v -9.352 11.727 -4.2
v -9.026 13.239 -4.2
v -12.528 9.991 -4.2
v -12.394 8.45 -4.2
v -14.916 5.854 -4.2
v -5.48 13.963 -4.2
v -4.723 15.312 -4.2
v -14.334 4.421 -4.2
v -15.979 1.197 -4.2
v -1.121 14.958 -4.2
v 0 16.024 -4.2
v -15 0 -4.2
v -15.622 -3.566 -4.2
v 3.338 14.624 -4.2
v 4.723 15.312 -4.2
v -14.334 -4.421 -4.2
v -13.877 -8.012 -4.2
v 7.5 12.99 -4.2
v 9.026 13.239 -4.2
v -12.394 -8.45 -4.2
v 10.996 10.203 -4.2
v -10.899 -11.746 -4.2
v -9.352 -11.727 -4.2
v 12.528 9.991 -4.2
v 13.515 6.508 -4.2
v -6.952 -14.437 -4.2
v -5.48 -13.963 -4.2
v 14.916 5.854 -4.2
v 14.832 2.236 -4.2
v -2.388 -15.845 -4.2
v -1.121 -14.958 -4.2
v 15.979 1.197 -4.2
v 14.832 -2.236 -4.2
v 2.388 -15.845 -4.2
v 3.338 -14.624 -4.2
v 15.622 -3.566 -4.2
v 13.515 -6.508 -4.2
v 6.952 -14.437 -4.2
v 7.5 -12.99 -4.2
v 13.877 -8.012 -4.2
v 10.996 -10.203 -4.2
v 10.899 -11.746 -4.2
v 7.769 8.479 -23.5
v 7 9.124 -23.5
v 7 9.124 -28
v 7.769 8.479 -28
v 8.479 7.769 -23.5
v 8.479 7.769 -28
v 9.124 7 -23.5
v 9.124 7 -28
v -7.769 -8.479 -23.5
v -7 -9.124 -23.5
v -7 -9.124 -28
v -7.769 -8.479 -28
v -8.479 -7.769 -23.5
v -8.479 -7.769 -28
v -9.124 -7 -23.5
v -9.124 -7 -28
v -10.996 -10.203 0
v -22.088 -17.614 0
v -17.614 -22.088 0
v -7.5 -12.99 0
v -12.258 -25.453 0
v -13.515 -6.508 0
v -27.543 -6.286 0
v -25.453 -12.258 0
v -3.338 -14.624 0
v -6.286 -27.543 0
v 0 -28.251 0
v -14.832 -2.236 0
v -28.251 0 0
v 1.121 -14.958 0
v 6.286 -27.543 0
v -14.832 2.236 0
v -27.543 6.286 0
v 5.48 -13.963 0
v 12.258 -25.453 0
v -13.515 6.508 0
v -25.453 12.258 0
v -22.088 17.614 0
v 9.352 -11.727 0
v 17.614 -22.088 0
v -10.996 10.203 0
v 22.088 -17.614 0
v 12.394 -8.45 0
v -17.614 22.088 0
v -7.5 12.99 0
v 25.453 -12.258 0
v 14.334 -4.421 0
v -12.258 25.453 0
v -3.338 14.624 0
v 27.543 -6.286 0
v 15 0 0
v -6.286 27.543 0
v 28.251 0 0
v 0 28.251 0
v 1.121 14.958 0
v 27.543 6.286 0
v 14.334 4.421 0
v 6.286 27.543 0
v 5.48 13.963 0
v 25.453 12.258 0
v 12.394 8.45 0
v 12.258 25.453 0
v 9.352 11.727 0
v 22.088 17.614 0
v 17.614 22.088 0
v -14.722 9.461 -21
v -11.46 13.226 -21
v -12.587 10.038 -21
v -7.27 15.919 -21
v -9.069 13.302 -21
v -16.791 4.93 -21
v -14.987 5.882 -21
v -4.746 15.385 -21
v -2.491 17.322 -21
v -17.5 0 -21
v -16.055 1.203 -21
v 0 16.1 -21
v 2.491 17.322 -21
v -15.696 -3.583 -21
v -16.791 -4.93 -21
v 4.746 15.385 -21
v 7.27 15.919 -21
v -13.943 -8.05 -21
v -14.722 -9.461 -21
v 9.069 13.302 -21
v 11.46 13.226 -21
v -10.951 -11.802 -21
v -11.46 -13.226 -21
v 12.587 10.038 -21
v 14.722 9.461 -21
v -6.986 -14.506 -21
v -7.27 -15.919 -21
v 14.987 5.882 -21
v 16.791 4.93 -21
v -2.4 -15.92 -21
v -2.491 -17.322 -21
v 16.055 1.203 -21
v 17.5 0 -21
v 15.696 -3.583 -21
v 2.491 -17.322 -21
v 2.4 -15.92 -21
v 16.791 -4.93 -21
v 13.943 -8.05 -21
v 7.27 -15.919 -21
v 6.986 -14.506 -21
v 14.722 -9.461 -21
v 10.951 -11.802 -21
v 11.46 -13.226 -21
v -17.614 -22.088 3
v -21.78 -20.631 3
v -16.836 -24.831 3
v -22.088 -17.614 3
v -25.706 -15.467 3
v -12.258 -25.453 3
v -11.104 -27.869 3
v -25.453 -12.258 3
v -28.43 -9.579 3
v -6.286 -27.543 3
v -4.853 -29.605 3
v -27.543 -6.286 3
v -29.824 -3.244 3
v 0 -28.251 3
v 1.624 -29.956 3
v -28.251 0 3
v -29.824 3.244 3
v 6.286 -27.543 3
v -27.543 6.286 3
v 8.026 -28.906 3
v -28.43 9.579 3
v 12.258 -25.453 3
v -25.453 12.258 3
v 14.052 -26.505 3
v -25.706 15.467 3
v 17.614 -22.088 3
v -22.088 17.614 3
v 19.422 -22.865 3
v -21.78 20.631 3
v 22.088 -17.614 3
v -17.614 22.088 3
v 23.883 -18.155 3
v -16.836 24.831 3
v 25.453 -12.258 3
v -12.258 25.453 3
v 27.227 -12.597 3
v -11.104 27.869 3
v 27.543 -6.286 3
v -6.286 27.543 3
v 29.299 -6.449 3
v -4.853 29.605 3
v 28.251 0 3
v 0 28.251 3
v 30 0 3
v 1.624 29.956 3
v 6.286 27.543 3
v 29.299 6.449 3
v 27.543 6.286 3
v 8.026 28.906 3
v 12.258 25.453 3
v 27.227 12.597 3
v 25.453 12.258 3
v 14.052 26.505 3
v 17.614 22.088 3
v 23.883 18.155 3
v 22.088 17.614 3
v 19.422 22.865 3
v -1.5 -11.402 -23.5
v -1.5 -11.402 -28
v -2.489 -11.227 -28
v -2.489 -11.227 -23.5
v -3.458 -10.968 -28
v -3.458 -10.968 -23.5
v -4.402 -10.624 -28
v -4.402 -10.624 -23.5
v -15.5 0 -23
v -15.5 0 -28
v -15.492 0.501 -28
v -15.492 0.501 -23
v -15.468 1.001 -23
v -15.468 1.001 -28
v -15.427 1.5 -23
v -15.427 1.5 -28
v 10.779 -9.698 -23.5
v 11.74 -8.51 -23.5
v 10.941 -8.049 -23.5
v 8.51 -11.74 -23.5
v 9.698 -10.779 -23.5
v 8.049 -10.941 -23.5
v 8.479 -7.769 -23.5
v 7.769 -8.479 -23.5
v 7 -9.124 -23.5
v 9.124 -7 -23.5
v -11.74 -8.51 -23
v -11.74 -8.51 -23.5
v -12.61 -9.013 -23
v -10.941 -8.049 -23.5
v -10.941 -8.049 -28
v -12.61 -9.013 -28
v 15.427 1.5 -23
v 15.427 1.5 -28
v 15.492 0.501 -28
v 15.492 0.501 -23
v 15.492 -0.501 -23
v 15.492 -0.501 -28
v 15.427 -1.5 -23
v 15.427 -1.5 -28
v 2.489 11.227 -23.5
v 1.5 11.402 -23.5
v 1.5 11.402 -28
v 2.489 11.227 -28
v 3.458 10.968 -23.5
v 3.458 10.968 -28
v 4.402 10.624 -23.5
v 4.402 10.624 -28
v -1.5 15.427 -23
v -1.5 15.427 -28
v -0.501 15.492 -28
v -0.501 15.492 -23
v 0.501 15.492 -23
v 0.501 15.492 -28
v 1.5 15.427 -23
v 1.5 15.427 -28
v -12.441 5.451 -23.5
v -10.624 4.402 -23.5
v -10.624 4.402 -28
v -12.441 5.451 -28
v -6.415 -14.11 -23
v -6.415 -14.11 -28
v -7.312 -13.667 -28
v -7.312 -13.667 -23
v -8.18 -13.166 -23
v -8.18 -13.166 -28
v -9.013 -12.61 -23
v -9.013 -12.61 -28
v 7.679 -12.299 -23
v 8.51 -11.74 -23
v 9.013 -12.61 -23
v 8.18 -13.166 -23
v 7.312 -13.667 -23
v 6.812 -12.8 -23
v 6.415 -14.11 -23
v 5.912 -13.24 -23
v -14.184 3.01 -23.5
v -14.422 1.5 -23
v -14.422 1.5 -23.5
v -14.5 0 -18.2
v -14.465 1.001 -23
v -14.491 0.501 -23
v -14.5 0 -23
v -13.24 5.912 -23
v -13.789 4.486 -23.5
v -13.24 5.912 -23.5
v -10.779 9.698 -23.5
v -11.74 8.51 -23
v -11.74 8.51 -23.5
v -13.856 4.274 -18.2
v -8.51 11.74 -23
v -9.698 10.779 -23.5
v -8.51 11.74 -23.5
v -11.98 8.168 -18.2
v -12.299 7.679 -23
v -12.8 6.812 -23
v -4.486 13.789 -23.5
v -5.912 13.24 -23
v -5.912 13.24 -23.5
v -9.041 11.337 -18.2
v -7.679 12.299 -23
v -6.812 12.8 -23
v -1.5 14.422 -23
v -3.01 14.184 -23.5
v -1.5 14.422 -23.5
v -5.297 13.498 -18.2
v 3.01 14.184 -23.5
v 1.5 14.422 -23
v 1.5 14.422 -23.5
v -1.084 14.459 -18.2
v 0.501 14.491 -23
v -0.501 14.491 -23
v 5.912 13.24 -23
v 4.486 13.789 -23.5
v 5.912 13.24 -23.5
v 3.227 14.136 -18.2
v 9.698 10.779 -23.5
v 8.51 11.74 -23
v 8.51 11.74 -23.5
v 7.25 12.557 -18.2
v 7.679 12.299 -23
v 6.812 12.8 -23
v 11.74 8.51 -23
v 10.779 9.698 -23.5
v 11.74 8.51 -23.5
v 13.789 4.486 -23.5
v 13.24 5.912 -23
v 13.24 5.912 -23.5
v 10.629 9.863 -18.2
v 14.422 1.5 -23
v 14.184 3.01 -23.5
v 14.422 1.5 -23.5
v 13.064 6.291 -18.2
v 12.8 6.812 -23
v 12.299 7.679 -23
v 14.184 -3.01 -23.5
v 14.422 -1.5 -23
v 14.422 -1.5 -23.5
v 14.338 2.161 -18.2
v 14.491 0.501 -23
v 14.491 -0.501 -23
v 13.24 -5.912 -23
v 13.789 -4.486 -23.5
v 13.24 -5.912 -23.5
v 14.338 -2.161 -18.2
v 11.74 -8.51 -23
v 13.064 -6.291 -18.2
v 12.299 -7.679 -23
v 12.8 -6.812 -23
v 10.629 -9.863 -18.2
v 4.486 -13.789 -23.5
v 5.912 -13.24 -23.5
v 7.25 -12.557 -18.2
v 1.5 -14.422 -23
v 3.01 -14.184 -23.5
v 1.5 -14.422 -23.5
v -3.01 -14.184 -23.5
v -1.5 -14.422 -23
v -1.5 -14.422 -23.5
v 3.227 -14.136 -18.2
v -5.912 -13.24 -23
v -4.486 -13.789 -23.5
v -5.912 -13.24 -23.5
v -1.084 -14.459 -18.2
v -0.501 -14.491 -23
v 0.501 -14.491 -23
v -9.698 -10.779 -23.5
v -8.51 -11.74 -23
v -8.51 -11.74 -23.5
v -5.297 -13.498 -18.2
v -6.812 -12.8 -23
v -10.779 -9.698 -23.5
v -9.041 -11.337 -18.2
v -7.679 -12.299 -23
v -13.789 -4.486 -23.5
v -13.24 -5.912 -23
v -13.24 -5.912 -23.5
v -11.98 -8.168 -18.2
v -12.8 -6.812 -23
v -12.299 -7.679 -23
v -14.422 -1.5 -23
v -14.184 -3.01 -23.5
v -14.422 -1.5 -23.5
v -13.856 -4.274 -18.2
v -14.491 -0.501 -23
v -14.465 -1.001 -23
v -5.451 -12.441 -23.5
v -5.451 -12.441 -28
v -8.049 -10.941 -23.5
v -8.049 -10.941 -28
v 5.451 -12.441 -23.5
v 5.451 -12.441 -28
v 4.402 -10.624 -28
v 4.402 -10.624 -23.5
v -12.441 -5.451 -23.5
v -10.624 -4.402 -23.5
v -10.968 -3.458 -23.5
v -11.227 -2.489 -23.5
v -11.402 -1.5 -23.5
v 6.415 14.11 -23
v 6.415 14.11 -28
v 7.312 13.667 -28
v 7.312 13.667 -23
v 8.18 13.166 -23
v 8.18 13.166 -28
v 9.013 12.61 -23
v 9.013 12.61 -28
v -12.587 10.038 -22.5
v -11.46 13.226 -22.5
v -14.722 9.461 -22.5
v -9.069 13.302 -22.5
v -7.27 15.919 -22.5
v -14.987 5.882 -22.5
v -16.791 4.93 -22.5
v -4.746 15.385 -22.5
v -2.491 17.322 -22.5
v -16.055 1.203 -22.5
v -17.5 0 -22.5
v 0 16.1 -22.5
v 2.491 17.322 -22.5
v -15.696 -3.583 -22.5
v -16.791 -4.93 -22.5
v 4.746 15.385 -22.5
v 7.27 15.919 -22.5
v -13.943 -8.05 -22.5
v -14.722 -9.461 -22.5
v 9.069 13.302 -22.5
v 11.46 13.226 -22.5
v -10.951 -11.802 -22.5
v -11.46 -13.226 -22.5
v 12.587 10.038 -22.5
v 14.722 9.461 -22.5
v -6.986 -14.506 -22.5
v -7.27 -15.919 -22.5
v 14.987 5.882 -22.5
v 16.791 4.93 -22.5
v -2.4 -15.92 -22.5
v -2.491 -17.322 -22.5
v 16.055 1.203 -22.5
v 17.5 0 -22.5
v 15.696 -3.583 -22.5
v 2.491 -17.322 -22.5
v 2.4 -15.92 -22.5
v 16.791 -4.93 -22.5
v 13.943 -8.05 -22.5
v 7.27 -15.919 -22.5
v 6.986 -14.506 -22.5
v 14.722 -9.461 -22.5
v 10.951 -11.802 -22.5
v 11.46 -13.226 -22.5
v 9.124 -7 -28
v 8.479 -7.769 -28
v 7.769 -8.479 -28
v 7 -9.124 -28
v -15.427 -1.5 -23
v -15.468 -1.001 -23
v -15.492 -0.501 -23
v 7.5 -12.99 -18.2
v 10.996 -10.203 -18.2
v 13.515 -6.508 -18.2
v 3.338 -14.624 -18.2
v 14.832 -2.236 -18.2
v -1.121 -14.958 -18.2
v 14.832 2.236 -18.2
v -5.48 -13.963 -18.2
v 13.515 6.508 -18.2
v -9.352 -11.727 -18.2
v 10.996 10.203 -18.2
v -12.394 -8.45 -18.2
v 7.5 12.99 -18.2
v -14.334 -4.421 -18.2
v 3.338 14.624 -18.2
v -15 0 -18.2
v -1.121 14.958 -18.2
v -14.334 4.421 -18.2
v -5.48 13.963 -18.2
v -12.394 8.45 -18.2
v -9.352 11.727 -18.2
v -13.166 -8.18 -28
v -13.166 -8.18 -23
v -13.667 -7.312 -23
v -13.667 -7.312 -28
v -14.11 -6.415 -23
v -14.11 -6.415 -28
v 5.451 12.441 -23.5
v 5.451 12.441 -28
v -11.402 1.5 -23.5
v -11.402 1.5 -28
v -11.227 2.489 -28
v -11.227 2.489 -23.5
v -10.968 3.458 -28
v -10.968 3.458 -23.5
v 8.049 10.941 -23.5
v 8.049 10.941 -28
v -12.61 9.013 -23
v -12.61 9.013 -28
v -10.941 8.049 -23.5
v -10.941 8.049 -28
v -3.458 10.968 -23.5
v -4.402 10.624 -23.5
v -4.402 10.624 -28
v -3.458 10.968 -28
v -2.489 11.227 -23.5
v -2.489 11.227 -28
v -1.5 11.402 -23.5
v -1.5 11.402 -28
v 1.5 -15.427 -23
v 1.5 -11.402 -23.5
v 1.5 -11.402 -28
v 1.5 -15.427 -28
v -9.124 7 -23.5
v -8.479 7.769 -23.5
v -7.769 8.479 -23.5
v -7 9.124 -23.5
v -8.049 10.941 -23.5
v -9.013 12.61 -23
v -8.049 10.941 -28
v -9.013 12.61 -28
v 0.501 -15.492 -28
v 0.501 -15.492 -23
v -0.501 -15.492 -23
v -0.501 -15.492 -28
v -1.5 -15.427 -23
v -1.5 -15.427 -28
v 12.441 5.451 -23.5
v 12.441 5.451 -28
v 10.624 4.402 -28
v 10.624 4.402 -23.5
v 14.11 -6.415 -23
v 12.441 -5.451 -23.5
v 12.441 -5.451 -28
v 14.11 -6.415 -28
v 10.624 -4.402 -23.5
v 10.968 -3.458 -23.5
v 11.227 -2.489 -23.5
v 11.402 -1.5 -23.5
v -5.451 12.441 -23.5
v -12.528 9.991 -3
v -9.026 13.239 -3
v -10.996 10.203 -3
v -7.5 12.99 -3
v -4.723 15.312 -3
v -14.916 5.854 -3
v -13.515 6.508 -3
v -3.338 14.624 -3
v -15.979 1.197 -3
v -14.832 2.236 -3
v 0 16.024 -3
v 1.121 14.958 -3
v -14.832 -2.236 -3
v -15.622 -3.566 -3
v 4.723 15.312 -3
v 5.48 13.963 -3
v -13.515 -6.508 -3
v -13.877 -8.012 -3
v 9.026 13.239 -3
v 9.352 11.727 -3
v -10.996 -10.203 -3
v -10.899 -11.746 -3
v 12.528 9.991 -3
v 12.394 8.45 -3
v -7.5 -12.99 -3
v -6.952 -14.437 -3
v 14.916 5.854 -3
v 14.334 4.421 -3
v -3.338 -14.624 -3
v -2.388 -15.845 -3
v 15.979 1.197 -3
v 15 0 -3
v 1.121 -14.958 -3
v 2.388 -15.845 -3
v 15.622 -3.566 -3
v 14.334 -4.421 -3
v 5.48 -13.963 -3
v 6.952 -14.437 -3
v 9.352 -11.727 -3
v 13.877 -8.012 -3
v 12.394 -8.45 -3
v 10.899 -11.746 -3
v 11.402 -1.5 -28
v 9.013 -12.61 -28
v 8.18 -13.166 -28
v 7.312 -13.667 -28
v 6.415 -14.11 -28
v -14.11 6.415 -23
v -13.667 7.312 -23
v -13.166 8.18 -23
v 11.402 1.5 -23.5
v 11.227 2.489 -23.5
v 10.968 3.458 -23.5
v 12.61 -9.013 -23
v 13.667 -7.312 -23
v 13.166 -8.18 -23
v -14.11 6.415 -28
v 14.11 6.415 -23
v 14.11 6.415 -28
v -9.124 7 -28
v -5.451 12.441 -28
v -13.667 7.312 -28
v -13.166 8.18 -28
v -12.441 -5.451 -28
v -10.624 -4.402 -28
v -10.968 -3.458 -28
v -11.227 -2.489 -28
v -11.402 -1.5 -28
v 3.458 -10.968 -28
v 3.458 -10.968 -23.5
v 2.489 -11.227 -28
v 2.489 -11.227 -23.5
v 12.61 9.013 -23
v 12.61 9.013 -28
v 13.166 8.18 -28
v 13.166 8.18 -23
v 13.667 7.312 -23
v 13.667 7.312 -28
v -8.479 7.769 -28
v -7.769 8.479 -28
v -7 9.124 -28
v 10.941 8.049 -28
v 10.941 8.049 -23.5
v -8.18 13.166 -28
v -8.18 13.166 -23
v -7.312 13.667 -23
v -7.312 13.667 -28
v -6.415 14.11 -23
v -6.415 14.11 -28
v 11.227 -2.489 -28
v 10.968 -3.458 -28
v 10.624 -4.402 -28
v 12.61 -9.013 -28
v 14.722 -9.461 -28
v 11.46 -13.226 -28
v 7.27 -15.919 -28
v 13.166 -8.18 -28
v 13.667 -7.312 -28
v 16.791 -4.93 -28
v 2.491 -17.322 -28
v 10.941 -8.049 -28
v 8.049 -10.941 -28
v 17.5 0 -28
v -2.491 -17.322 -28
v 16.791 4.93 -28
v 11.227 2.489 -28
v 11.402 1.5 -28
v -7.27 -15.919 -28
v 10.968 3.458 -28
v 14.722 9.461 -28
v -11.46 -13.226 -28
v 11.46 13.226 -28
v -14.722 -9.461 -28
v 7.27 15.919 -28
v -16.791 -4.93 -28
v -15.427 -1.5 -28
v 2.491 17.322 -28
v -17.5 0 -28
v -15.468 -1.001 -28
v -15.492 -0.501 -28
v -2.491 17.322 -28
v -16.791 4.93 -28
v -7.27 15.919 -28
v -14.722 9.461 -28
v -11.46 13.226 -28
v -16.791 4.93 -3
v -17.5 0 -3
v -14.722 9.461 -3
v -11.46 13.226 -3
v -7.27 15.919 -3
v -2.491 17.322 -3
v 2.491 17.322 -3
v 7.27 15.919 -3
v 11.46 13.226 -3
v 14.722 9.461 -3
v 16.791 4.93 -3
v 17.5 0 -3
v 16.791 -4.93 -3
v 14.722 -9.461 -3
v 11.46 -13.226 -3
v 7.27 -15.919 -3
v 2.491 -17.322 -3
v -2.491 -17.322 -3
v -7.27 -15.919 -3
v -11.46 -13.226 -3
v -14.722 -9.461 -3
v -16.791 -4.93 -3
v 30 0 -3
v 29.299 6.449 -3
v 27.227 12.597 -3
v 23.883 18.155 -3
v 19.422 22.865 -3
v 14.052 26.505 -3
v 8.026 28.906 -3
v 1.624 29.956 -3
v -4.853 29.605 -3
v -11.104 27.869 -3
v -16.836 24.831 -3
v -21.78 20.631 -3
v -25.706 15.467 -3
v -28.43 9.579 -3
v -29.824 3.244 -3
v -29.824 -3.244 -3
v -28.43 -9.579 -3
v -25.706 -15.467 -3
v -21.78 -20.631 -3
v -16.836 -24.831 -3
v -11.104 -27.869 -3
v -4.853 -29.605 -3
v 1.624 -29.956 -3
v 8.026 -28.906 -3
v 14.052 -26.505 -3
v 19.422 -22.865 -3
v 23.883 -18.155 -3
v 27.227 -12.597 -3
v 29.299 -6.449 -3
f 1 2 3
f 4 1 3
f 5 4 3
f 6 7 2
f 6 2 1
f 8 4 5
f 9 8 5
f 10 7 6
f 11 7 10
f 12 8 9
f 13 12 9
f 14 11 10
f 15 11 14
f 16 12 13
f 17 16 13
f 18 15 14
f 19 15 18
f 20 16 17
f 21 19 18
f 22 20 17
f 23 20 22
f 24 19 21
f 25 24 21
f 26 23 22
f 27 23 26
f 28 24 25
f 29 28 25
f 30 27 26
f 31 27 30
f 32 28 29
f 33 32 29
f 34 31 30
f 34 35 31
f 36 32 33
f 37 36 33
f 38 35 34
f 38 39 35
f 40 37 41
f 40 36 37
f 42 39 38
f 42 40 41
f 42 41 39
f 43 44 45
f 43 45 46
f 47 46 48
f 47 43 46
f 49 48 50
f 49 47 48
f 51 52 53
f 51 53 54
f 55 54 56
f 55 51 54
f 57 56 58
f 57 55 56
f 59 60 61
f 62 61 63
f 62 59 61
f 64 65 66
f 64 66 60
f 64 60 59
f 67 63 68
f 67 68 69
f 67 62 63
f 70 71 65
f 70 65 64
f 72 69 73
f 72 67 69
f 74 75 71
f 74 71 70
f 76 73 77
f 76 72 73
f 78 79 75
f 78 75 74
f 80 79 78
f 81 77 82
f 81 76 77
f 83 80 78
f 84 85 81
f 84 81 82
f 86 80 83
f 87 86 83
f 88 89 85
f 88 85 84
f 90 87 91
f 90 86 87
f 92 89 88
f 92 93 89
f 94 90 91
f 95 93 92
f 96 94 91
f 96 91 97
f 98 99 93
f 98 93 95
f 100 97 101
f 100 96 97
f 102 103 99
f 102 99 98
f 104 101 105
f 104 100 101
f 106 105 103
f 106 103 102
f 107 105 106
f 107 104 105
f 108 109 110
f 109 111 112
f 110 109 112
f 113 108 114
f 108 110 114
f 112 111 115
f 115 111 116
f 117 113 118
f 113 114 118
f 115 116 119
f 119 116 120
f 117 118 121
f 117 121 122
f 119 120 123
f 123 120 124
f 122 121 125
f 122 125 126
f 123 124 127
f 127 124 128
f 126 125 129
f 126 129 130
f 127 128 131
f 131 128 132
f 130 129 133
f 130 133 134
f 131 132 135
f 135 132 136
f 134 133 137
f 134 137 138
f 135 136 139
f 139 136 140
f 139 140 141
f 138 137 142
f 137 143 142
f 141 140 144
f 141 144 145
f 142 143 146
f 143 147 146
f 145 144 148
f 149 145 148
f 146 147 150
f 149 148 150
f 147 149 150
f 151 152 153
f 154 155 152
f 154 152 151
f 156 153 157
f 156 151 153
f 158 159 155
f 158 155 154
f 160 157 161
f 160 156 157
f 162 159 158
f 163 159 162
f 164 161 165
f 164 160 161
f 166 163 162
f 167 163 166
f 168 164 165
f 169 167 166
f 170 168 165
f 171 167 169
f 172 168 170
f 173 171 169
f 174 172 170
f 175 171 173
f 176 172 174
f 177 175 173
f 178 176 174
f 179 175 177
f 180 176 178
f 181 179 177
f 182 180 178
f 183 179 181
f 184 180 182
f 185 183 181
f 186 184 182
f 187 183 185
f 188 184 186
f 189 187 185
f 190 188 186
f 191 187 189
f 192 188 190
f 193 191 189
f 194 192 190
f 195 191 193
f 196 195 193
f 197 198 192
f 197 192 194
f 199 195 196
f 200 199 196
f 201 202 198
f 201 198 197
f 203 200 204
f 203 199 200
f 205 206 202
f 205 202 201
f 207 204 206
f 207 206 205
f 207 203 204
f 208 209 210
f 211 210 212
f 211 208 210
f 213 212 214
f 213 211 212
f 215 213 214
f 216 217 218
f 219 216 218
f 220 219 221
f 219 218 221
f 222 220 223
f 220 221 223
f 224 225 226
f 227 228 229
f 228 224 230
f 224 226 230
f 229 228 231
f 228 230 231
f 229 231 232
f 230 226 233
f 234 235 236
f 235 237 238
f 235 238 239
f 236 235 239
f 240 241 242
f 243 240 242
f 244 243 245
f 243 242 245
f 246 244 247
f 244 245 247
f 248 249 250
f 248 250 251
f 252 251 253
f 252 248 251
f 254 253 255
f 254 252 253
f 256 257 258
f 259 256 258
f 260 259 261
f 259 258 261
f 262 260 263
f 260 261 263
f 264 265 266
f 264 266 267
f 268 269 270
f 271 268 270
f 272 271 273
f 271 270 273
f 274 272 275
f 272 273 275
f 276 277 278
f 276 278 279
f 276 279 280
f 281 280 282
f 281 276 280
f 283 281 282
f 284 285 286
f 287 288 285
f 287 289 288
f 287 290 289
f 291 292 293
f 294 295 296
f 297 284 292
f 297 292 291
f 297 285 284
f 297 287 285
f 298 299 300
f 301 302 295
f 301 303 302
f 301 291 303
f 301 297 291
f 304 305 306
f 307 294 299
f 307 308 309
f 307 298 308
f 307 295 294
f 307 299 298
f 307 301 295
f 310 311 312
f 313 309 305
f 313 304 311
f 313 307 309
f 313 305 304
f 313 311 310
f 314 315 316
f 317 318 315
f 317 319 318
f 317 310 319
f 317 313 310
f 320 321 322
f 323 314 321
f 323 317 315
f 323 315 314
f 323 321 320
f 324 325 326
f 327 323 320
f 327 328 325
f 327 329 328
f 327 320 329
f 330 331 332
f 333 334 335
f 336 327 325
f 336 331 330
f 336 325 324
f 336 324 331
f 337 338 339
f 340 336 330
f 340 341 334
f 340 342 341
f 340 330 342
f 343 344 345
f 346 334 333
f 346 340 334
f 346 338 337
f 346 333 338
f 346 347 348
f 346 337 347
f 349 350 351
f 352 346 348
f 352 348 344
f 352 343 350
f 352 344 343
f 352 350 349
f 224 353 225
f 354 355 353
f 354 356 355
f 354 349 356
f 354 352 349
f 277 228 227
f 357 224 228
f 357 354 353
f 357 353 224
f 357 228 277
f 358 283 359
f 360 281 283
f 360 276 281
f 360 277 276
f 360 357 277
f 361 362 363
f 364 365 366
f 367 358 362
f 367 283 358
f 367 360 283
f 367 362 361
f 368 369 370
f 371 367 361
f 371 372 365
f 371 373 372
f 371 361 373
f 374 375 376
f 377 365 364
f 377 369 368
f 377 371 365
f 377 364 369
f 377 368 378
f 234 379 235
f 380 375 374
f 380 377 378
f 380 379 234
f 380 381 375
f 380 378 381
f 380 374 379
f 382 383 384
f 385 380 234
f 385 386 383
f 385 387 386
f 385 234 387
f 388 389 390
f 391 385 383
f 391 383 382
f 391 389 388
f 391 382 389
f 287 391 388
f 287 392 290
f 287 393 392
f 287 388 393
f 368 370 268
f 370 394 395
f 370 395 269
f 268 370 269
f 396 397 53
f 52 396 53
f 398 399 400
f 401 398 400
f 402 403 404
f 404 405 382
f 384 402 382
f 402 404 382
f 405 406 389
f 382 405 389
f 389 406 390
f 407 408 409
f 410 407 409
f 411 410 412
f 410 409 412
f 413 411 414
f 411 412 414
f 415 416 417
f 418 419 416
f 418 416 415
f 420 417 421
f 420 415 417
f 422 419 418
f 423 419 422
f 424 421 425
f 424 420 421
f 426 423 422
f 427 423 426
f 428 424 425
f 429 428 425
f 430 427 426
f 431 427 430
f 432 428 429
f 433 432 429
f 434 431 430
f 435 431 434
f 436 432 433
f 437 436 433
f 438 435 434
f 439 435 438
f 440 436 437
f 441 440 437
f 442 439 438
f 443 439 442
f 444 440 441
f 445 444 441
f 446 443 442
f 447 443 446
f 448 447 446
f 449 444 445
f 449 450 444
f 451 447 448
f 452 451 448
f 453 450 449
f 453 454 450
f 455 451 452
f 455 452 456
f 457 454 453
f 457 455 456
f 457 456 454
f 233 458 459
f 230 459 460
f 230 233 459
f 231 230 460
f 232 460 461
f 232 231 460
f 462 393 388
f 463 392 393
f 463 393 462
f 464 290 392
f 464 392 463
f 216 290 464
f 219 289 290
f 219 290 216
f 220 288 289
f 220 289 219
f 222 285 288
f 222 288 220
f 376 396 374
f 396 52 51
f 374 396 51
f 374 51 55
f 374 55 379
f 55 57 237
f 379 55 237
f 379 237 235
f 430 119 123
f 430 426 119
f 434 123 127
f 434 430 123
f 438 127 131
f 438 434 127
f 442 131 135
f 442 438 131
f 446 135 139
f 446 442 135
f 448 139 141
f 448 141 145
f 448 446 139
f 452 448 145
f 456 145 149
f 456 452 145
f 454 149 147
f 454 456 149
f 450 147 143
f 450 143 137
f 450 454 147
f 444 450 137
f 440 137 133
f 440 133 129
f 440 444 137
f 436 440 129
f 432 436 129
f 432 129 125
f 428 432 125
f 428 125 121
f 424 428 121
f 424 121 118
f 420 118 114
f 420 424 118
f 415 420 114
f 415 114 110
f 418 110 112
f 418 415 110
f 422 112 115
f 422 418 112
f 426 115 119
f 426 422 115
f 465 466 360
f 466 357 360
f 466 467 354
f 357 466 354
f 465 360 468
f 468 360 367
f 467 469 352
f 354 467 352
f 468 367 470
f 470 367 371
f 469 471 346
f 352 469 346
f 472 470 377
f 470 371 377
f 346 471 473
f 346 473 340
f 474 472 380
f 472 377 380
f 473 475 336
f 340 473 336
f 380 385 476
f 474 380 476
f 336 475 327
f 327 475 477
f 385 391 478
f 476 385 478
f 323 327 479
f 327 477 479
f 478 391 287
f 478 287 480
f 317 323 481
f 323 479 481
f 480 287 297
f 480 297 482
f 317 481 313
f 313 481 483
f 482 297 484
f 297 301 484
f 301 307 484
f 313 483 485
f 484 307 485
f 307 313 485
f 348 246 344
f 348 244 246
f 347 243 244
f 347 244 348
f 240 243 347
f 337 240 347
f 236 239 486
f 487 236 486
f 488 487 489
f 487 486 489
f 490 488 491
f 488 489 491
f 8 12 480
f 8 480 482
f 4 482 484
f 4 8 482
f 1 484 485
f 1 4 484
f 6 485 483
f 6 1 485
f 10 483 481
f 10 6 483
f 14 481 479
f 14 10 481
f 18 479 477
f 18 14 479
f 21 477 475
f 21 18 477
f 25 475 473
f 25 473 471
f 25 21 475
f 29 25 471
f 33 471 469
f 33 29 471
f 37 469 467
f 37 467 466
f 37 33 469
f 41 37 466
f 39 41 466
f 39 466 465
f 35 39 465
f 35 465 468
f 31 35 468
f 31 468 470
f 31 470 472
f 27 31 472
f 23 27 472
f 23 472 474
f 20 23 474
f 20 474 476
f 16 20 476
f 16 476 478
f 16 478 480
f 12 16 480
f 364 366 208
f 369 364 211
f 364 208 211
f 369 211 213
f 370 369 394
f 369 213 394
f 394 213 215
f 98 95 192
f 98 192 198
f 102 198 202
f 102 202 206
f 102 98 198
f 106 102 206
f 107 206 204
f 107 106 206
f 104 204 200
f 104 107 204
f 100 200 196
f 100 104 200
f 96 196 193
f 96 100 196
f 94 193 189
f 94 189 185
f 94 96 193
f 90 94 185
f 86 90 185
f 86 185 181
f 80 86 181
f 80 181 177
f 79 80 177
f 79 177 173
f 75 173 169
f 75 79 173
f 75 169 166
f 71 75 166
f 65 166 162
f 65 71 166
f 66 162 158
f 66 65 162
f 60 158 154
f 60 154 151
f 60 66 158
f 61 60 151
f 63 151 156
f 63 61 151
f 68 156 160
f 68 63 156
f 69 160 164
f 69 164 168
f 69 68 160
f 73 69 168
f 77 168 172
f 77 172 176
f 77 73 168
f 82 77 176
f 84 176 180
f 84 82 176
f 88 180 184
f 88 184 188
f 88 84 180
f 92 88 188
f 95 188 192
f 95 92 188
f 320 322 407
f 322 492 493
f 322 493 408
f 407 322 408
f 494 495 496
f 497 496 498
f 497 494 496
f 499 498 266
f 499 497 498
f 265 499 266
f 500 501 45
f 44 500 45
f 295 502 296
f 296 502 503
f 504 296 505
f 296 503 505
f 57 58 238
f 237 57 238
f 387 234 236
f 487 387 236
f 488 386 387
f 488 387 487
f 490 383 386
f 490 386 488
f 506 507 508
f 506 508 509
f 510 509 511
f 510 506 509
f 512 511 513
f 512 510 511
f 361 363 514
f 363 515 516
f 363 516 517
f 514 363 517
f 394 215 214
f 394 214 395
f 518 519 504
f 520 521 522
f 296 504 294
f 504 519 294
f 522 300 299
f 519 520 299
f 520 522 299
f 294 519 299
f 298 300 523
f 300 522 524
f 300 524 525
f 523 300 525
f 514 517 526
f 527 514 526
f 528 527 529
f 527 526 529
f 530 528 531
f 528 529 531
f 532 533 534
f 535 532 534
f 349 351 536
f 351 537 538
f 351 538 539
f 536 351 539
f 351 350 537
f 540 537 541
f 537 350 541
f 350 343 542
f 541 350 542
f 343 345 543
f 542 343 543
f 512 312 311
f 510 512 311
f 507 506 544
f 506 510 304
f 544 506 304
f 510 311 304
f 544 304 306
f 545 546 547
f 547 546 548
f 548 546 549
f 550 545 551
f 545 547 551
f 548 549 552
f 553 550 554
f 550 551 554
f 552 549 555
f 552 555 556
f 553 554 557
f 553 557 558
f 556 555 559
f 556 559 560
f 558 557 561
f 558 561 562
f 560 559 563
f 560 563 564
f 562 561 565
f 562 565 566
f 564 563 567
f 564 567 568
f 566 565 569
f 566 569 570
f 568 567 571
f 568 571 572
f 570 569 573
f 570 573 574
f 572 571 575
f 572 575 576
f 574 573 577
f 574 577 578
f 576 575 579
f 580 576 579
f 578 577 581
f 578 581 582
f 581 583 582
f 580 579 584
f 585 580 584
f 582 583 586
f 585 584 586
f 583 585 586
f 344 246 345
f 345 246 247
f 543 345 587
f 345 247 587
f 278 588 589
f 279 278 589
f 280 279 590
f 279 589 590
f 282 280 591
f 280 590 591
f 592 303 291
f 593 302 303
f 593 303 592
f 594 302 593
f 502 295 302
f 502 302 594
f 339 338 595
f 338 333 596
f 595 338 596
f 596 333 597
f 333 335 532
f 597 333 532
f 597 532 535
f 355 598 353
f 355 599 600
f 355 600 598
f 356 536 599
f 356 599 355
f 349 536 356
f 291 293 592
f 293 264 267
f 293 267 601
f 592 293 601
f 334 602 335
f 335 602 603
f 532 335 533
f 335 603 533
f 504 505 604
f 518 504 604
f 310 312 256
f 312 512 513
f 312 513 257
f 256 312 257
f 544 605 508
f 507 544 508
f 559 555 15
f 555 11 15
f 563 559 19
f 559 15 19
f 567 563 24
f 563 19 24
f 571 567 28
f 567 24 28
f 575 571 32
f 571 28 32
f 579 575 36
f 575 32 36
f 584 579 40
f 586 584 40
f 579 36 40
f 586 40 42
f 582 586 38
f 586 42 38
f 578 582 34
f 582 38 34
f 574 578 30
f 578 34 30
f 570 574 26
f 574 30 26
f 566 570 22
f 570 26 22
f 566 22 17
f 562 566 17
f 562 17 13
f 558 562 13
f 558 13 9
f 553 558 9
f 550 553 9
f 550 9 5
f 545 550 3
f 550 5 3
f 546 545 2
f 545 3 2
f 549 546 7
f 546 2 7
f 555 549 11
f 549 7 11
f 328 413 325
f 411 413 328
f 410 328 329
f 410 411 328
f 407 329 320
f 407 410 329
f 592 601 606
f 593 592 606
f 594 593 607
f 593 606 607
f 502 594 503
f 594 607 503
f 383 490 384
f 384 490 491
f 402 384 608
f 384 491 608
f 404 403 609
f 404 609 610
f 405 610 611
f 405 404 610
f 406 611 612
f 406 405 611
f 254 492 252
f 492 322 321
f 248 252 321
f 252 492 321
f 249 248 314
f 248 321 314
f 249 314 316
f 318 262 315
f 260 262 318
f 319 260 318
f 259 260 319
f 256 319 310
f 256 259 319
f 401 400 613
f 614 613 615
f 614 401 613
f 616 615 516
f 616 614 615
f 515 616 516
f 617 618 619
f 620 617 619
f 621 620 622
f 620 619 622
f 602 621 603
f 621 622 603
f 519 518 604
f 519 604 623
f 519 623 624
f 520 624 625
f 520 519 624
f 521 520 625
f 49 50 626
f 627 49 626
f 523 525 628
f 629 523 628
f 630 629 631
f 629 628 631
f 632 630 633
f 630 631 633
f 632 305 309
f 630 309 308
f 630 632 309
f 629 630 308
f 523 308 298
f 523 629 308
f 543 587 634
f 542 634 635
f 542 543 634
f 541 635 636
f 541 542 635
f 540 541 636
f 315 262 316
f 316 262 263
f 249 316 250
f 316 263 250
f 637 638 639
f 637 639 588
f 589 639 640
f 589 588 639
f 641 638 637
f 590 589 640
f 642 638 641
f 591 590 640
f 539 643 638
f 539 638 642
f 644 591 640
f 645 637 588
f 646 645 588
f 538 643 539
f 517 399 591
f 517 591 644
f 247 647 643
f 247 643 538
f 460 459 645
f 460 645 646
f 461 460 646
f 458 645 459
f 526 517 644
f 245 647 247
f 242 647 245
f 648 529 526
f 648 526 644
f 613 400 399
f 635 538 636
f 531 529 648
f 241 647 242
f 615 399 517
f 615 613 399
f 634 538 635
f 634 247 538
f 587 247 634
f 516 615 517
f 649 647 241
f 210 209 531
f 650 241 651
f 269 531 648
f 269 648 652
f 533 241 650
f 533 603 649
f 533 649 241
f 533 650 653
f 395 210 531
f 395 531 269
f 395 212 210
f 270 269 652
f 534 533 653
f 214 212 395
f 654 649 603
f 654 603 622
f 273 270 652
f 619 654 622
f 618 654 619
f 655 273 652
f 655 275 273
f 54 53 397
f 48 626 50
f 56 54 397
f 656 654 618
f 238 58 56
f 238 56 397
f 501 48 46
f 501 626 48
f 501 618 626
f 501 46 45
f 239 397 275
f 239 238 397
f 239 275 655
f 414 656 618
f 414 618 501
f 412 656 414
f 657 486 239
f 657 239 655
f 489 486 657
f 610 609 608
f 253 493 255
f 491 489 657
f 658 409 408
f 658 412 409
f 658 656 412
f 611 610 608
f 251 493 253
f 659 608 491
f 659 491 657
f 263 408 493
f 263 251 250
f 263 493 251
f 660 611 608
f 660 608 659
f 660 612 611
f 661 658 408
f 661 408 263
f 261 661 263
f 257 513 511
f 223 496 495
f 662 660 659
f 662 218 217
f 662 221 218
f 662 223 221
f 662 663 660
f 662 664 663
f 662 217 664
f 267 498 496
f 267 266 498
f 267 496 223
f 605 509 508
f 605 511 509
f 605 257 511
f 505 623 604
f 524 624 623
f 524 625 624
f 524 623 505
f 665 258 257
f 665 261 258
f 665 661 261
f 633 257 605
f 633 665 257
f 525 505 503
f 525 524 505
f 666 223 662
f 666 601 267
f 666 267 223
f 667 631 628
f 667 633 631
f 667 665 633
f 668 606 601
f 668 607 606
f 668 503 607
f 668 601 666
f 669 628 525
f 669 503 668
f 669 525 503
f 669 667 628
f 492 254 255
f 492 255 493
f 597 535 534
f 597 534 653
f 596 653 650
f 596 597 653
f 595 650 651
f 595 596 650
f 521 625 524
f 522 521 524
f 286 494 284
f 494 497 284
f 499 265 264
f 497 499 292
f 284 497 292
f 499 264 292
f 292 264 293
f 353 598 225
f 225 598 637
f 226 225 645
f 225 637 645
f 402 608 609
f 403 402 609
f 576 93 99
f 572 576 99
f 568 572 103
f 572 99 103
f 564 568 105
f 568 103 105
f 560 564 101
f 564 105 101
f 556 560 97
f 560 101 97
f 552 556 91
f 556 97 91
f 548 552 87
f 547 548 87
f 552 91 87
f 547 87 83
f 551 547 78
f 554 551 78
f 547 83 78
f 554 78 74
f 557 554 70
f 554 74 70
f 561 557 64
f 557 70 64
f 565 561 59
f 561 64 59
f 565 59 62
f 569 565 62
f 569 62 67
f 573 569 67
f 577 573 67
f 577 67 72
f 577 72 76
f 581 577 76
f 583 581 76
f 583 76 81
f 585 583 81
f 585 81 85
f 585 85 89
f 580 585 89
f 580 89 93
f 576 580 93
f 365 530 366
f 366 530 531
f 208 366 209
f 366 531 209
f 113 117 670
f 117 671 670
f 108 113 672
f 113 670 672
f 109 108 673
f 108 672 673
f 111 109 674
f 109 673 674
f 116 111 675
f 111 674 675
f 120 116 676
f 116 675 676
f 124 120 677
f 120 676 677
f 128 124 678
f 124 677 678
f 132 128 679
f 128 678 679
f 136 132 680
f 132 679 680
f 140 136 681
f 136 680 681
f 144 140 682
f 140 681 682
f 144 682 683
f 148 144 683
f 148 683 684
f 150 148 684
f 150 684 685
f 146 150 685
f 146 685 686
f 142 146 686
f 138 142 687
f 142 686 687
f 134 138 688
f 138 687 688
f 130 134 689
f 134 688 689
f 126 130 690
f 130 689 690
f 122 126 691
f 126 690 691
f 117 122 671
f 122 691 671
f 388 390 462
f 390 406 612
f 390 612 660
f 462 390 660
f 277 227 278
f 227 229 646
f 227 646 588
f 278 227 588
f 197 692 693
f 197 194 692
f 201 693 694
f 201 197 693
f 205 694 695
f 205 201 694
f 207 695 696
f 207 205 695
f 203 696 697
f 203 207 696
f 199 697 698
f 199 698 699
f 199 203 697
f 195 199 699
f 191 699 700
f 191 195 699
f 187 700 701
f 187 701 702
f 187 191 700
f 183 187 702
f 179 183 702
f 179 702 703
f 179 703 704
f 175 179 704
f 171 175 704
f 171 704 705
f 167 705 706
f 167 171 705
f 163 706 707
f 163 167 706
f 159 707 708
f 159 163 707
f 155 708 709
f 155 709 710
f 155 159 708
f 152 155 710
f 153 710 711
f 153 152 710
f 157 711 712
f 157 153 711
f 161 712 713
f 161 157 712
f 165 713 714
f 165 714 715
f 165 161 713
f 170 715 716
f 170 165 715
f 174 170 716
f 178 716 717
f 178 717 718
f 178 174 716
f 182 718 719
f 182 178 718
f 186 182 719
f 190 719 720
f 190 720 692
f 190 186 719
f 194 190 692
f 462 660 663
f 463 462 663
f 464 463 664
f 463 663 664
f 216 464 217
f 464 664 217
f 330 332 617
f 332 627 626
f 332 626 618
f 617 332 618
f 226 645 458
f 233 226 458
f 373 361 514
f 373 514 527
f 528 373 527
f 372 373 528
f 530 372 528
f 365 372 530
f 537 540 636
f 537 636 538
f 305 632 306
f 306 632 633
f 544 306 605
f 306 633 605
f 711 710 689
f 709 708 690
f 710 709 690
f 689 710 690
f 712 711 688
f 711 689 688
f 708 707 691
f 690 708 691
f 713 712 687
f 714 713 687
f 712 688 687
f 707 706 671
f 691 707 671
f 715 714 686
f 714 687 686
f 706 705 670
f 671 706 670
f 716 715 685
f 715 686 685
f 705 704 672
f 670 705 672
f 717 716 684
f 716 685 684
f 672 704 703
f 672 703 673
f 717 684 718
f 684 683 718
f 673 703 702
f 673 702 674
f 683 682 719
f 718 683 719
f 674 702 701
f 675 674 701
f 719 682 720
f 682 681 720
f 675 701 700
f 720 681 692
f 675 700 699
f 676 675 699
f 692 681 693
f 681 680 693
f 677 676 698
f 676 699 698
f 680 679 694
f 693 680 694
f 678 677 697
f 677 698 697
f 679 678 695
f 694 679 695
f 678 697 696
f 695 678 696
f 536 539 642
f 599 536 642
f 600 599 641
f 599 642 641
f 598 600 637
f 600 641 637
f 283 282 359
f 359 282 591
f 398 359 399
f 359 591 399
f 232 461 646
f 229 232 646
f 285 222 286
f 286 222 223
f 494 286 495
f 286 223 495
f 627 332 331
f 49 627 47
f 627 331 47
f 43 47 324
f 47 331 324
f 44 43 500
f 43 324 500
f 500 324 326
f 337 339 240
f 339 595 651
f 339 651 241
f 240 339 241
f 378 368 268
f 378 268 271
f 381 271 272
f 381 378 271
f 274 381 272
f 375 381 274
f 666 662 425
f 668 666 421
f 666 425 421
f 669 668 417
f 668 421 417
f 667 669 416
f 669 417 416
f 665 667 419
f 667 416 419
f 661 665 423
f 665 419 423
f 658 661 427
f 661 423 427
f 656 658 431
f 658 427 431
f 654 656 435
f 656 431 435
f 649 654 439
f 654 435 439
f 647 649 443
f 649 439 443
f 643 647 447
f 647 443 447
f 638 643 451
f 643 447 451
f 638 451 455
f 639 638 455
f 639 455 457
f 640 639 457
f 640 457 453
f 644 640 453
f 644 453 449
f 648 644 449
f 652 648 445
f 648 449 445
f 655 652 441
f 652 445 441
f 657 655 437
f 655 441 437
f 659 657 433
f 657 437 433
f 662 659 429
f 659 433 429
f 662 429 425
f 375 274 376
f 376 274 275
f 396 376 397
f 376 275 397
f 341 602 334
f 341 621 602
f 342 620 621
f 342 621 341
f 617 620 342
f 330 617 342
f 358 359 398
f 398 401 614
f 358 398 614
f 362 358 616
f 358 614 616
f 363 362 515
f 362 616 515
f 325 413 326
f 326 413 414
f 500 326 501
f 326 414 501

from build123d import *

# Parameters (mm, degrees)
SKETCH_1_R          = 30
SKETCH_1_R_2        = 28.251
EXTRUDE_1_DEPTH     = 3
SKETCH_2_R          = 30
SKETCH_2_R_2        = 15
EXTRUDE_2_DEPTH     = 3
SKETCH_4_R          = 17.5
SKETCH_4_R_2        = 15
EXTRUDE_3_DEPTH     = 20
SKETCH_5_R          = 17.5
SKETCH_5_R_2        = 14.5
EXTRUDE_4_DEPTH     = 0.5
SKETCH_6_W          = 1.5
SKETCH_6_H          = 1.4
SKETCH_7_W          = 1.2
SKETCH_7_H          = 1.05
SKETCH_8_R          = 15
SKETCH_8_R_2        = 14.5
EXTRUDE_5_DEPTH     = 4.8
SKETCH_9_R          = 17.5
SKETCH_9_R_2        = 11.5
EXTRUDE_6_DEPTH     = 4.5
CUT_EXTRUDE_1_DEPTH = 5


with BuildPart() as part:
    # 草图1 → 凸台-拉伸1 (new body)
    with BuildSketch(Plane.XY):
        Circle(SKETCH_1_R)
        Circle(SKETCH_1_R_2, mode=Mode.SUBTRACT)
    extrude(amount=EXTRUDE_1_DEPTH)

    # 草图2 → 凸台-拉伸2 (add)
    with BuildSketch(Plane.XY):
        Circle(SKETCH_2_R)
        Circle(SKETCH_2_R_2, mode=Mode.SUBTRACT)
    extrude(amount=-EXTRUDE_2_DEPTH)

    # 草图4 → 凸台-拉伸3 (add)
    with BuildSketch(Plane(origin=(0, 0, -3), x_dir=(-1, 0, 0), z_dir=(0, 0, -1))):
        Circle(SKETCH_4_R)
        Circle(SKETCH_4_R_2, mode=Mode.SUBTRACT)
    extrude(amount=EXTRUDE_3_DEPTH)

    # 草图5 → 凸台-拉伸4 (add)
    with BuildSketch(Plane(origin=(0, 0, -23), x_dir=(-1, 0, 0), z_dir=(0, 0, -1))):
        Circle(SKETCH_5_R)
        Circle(SKETCH_5_R_2, mode=Mode.SUBTRACT)
    extrude(amount=EXTRUDE_4_DEPTH)

    # 草图6 → 切除-旋转1 (revolve, cut)
    with BuildSketch(Plane(origin=(0, 0, 0), x_dir=(0, 0, -1), z_dir=(1, 0, 0))):
        with Locations((21.75, 16.8)):
            Rectangle(SKETCH_6_W, SKETCH_6_H)
    revolve(axis=Axis((0, 0, 3), (0, 0, -1)), mode=Mode.SUBTRACT)

    # 草图7 → 切除-旋转2 (revolve, cut)
    with BuildSketch(Plane(origin=(0, 0, 0), x_dir=(0, 0, -1), z_dir=(1, 0, 0))):
        with Locations((3.6, 15.498648932)):
            Rectangle(SKETCH_7_W, SKETCH_7_H)
    revolve(axis=Axis((0, 0, 3), (0, 0, -1)), mode=Mode.SUBTRACT)

    # 草图8 → 凸台-拉伸5 (add)
    with BuildSketch(Plane(origin=(0, 0, -23), x_dir=(-1, 0, 0), z_dir=(0, 0, -1))):
        Circle(SKETCH_8_R)
        Circle(SKETCH_8_R_2, mode=Mode.SUBTRACT)
    extrude(amount=-EXTRUDE_5_DEPTH)

    # 草图9 → 凸台-拉伸6 (add)
    with BuildSketch(Plane(origin=(0, 0, -23.5), x_dir=(-1, 0, 0), z_dir=(0, 0, -1))):
        Circle(SKETCH_9_R)
        Circle(SKETCH_9_R_2, mode=Mode.SUBTRACT)
    extrude(amount=EXTRUDE_6_DEPTH)

    # 草图10 → 切除-拉伸1 (cut)
    with BuildSketch(Plane(origin=(0, 0, -28), x_dir=(-1, 0, 0), z_dir=(0, 0, -1))):
        with BuildLine():
            ThreePointArc((-1.5, 11.401754251), (0, 11.5), (1.5, 11.401754251))
            Line((1.5, 11.401754251), (1.5, 13.5))
            Line((1.5, 13.5), (1.5, 15.427248621))
            ThreePointArc((1.5, 15.427248621), (0, 15.5), (-1.5, 15.427248621))
            Line((-1.5, 15.427248621), (-1.5, 13.5))
            Line((-1.5, 13.5), (-1.5, 11.401754251))
        make_face()
        with BuildLine():
            Line((6.414586205, 14.110389216), (5.450961894, 12.441342951))
            Line((5.450961894, 12.441342951), (4.40183902, 10.624208829))
            ThreePointArc((4.40183902, 10.624208829), (5.75, 9.959292144), (6.999915231, 9.124208829))
            Line((6.999915231, 9.124208829), (8.049038106, 10.941342951))
            Line((8.049038106, 10.941342951), (9.012662416, 12.610389216))
            ThreePointArc((9.012662416, 12.610389216), (7.75, 13.423393759), (6.414586205, 14.110389216))
        make_face()
        with BuildLine():
            Line((10.941342951, 8.049038106), (9.124208829, 6.999915231))
            ThreePointArc((9.124208829, 6.999915231), (9.959292144, 5.75), (10.624208829, 4.40183902))
            Line((10.624208829, 4.40183902), (12.441342951, 5.450961894))
            Line((12.441342951, 5.450961894), (14.110389216, 6.414586205))
            ThreePointArc((14.110389216, 6.414586205), (13.423393759, 7.75), (12.610389216, 9.012662416))
            Line((12.610389216, 9.012662416), (10.941342951, 8.049038106))
        make_face()
        with BuildLine():
            Line((13.5, 1.5), (11.401754251, 1.5))
            ThreePointArc((11.401754251, 1.5), (11.475412278, 0.751606983), (11.5, 0))
            ThreePointArc((11.5, 0), (11.475412278, -0.751606983), (11.401754251, -1.5))
            Line((11.401754251, -1.5), (13.5, -1.5))
            Line((13.5, -1.5), (15.427248621, -1.5))
            ThreePointArc((15.427248621, -1.5), (15.481801472, -0.750881609), (15.5, 0))
            ThreePointArc((15.5, 0), (15.481801472, 0.750881609), (15.427248621, 1.5))
            Line((15.427248621, 1.5), (13.5, 1.5))
        make_face()
        with BuildLine():
            Line((12.441342951, -5.450961894), (10.624208829, -4.40183902))
            ThreePointArc((10.624208829, -4.40183902), (9.959292144, -5.75), (9.124208829, -6.999915231))
            Line((9.124208829, -6.999915231), (10.941342951, -8.049038106))
            Line((10.941342951, -8.049038106), (12.610389216, -9.012662416))
            ThreePointArc((12.610389216, -9.012662416), (13.423393759, -7.75), (14.110389216, -6.414586205))
            Line((14.110389216, -6.414586205), (12.441342951, -5.450961894))
        make_face()
        with BuildLine():
            Line((8.049038106, -10.941342951), (6.999915231, -9.124208829))
            ThreePointArc((6.999915231, -9.124208829), (5.75, -9.959292144), (4.40183902, -10.624208829))
            Line((4.40183902, -10.624208829), (5.450961894, -12.441342951))
            Line((5.450961894, -12.441342951), (6.414586205, -14.110389216))
            ThreePointArc((6.414586205, -14.110389216), (7.75, -13.423393759), (9.012662416, -12.610389216))
            Line((9.012662416, -12.610389216), (8.049038106, -10.941342951))
        make_face()
        with BuildLine():
            Line((1.5, -13.5), (1.5, -11.401754251))
            ThreePointArc((1.5, -11.401754251), (0, -11.5), (-1.5, -11.401754251))
            Line((-1.5, -11.401754251), (-1.5, -13.5))
            Line((-1.5, -13.5), (-1.5, -15.427248621))
            ThreePointArc((-1.5, -15.427248621), (0, -15.5), (1.5, -15.427248621))
            Line((1.5, -15.427248621), (1.5, -13.5))
        make_face()
        with BuildLine():
            ThreePointArc((-4.40183902, -10.624208829), (-5.75, -9.959292144), (-6.999915231, -9.124208829))
            Line((-6.999915231, -9.124208829), (-8.049038106, -10.941342951))
            Line((-8.049038106, -10.941342951), (-9.012662416, -12.610389216))
            ThreePointArc((-9.012662416, -12.610389216), (-7.75, -13.423393759), (-6.414586205, -14.110389216))
            Line((-6.414586205, -14.110389216), (-5.450961894, -12.441342951))
            Line((-5.450961894, -12.441342951), (-4.40183902, -10.624208829))
        make_face()
        with BuildLine():
            ThreePointArc((-9.124208829, -6.999915231), (-9.959292144, -5.75), (-10.624208829, -4.40183902))
            Line((-10.624208829, -4.40183902), (-12.441342951, -5.450961894))
            Line((-12.441342951, -5.450961894), (-14.110389216, -6.414586205))
            ThreePointArc((-14.110389216, -6.414586205), (-13.423393759, -7.75), (-12.610389216, -9.012662416))
            Line((-12.610389216, -9.012662416), (-10.941342951, -8.049038106))
            Line((-10.941342951, -8.049038106), (-9.124208829, -6.999915231))
        make_face()
        with BuildLine():
            ThreePointArc((-11.401754251, -1.5), (-11.5, 0), (-11.401754251, 1.5))
            Line((-11.401754251, 1.5), (-13.5, 1.5))
            Line((-13.5, 1.5), (-15.427248621, 1.5))
            ThreePointArc((-15.427248621, 1.5), (-15.5, 0), (-15.427248621, -1.5))
            Line((-15.427248621, -1.5), (-13.5, -1.5))
            Line((-13.5, -1.5), (-11.401754251, -1.5))
        make_face()
        with BuildLine():
            ThreePointArc((-10.624208829, 4.40183902), (-9.959292144, 5.75), (-9.124208829, 6.999915231))
            Line((-9.124208829, 6.999915231), (-10.941342951, 8.049038106))
            Line((-10.941342951, 8.049038106), (-12.610389216, 9.012662416))
            ThreePointArc((-12.610389216, 9.012662416), (-13.423393759, 7.75), (-14.110389216, 6.414586205))
            Line((-14.110389216, 6.414586205), (-12.441342951, 5.450961894))
            Line((-12.441342951, 5.450961894), (-10.624208829, 4.40183902))
        make_face()
        with BuildLine():
            ThreePointArc((-6.999915231, 9.124208829), (-5.75, 9.959292144), (-4.40183902, 10.624208829))
            Line((-4.40183902, 10.624208829), (-5.450961894, 12.441342951))
            Line((-5.450961894, 12.441342951), (-6.414586205, 14.110389216))
            ThreePointArc((-6.414586205, 14.110389216), (-7.75, 13.423393759), (-9.012662416, 12.610389216))
            Line((-9.012662416, 12.610389216), (-8.049038106, 10.941342951))
            Line((-8.049038106, 10.941342951), (-6.999915231, 9.124208829))
        make_face()
    extrude(amount=-CUT_EXTRUDE_1_DEPTH, mode=Mode.SUBTRACT)


solid = part.part
